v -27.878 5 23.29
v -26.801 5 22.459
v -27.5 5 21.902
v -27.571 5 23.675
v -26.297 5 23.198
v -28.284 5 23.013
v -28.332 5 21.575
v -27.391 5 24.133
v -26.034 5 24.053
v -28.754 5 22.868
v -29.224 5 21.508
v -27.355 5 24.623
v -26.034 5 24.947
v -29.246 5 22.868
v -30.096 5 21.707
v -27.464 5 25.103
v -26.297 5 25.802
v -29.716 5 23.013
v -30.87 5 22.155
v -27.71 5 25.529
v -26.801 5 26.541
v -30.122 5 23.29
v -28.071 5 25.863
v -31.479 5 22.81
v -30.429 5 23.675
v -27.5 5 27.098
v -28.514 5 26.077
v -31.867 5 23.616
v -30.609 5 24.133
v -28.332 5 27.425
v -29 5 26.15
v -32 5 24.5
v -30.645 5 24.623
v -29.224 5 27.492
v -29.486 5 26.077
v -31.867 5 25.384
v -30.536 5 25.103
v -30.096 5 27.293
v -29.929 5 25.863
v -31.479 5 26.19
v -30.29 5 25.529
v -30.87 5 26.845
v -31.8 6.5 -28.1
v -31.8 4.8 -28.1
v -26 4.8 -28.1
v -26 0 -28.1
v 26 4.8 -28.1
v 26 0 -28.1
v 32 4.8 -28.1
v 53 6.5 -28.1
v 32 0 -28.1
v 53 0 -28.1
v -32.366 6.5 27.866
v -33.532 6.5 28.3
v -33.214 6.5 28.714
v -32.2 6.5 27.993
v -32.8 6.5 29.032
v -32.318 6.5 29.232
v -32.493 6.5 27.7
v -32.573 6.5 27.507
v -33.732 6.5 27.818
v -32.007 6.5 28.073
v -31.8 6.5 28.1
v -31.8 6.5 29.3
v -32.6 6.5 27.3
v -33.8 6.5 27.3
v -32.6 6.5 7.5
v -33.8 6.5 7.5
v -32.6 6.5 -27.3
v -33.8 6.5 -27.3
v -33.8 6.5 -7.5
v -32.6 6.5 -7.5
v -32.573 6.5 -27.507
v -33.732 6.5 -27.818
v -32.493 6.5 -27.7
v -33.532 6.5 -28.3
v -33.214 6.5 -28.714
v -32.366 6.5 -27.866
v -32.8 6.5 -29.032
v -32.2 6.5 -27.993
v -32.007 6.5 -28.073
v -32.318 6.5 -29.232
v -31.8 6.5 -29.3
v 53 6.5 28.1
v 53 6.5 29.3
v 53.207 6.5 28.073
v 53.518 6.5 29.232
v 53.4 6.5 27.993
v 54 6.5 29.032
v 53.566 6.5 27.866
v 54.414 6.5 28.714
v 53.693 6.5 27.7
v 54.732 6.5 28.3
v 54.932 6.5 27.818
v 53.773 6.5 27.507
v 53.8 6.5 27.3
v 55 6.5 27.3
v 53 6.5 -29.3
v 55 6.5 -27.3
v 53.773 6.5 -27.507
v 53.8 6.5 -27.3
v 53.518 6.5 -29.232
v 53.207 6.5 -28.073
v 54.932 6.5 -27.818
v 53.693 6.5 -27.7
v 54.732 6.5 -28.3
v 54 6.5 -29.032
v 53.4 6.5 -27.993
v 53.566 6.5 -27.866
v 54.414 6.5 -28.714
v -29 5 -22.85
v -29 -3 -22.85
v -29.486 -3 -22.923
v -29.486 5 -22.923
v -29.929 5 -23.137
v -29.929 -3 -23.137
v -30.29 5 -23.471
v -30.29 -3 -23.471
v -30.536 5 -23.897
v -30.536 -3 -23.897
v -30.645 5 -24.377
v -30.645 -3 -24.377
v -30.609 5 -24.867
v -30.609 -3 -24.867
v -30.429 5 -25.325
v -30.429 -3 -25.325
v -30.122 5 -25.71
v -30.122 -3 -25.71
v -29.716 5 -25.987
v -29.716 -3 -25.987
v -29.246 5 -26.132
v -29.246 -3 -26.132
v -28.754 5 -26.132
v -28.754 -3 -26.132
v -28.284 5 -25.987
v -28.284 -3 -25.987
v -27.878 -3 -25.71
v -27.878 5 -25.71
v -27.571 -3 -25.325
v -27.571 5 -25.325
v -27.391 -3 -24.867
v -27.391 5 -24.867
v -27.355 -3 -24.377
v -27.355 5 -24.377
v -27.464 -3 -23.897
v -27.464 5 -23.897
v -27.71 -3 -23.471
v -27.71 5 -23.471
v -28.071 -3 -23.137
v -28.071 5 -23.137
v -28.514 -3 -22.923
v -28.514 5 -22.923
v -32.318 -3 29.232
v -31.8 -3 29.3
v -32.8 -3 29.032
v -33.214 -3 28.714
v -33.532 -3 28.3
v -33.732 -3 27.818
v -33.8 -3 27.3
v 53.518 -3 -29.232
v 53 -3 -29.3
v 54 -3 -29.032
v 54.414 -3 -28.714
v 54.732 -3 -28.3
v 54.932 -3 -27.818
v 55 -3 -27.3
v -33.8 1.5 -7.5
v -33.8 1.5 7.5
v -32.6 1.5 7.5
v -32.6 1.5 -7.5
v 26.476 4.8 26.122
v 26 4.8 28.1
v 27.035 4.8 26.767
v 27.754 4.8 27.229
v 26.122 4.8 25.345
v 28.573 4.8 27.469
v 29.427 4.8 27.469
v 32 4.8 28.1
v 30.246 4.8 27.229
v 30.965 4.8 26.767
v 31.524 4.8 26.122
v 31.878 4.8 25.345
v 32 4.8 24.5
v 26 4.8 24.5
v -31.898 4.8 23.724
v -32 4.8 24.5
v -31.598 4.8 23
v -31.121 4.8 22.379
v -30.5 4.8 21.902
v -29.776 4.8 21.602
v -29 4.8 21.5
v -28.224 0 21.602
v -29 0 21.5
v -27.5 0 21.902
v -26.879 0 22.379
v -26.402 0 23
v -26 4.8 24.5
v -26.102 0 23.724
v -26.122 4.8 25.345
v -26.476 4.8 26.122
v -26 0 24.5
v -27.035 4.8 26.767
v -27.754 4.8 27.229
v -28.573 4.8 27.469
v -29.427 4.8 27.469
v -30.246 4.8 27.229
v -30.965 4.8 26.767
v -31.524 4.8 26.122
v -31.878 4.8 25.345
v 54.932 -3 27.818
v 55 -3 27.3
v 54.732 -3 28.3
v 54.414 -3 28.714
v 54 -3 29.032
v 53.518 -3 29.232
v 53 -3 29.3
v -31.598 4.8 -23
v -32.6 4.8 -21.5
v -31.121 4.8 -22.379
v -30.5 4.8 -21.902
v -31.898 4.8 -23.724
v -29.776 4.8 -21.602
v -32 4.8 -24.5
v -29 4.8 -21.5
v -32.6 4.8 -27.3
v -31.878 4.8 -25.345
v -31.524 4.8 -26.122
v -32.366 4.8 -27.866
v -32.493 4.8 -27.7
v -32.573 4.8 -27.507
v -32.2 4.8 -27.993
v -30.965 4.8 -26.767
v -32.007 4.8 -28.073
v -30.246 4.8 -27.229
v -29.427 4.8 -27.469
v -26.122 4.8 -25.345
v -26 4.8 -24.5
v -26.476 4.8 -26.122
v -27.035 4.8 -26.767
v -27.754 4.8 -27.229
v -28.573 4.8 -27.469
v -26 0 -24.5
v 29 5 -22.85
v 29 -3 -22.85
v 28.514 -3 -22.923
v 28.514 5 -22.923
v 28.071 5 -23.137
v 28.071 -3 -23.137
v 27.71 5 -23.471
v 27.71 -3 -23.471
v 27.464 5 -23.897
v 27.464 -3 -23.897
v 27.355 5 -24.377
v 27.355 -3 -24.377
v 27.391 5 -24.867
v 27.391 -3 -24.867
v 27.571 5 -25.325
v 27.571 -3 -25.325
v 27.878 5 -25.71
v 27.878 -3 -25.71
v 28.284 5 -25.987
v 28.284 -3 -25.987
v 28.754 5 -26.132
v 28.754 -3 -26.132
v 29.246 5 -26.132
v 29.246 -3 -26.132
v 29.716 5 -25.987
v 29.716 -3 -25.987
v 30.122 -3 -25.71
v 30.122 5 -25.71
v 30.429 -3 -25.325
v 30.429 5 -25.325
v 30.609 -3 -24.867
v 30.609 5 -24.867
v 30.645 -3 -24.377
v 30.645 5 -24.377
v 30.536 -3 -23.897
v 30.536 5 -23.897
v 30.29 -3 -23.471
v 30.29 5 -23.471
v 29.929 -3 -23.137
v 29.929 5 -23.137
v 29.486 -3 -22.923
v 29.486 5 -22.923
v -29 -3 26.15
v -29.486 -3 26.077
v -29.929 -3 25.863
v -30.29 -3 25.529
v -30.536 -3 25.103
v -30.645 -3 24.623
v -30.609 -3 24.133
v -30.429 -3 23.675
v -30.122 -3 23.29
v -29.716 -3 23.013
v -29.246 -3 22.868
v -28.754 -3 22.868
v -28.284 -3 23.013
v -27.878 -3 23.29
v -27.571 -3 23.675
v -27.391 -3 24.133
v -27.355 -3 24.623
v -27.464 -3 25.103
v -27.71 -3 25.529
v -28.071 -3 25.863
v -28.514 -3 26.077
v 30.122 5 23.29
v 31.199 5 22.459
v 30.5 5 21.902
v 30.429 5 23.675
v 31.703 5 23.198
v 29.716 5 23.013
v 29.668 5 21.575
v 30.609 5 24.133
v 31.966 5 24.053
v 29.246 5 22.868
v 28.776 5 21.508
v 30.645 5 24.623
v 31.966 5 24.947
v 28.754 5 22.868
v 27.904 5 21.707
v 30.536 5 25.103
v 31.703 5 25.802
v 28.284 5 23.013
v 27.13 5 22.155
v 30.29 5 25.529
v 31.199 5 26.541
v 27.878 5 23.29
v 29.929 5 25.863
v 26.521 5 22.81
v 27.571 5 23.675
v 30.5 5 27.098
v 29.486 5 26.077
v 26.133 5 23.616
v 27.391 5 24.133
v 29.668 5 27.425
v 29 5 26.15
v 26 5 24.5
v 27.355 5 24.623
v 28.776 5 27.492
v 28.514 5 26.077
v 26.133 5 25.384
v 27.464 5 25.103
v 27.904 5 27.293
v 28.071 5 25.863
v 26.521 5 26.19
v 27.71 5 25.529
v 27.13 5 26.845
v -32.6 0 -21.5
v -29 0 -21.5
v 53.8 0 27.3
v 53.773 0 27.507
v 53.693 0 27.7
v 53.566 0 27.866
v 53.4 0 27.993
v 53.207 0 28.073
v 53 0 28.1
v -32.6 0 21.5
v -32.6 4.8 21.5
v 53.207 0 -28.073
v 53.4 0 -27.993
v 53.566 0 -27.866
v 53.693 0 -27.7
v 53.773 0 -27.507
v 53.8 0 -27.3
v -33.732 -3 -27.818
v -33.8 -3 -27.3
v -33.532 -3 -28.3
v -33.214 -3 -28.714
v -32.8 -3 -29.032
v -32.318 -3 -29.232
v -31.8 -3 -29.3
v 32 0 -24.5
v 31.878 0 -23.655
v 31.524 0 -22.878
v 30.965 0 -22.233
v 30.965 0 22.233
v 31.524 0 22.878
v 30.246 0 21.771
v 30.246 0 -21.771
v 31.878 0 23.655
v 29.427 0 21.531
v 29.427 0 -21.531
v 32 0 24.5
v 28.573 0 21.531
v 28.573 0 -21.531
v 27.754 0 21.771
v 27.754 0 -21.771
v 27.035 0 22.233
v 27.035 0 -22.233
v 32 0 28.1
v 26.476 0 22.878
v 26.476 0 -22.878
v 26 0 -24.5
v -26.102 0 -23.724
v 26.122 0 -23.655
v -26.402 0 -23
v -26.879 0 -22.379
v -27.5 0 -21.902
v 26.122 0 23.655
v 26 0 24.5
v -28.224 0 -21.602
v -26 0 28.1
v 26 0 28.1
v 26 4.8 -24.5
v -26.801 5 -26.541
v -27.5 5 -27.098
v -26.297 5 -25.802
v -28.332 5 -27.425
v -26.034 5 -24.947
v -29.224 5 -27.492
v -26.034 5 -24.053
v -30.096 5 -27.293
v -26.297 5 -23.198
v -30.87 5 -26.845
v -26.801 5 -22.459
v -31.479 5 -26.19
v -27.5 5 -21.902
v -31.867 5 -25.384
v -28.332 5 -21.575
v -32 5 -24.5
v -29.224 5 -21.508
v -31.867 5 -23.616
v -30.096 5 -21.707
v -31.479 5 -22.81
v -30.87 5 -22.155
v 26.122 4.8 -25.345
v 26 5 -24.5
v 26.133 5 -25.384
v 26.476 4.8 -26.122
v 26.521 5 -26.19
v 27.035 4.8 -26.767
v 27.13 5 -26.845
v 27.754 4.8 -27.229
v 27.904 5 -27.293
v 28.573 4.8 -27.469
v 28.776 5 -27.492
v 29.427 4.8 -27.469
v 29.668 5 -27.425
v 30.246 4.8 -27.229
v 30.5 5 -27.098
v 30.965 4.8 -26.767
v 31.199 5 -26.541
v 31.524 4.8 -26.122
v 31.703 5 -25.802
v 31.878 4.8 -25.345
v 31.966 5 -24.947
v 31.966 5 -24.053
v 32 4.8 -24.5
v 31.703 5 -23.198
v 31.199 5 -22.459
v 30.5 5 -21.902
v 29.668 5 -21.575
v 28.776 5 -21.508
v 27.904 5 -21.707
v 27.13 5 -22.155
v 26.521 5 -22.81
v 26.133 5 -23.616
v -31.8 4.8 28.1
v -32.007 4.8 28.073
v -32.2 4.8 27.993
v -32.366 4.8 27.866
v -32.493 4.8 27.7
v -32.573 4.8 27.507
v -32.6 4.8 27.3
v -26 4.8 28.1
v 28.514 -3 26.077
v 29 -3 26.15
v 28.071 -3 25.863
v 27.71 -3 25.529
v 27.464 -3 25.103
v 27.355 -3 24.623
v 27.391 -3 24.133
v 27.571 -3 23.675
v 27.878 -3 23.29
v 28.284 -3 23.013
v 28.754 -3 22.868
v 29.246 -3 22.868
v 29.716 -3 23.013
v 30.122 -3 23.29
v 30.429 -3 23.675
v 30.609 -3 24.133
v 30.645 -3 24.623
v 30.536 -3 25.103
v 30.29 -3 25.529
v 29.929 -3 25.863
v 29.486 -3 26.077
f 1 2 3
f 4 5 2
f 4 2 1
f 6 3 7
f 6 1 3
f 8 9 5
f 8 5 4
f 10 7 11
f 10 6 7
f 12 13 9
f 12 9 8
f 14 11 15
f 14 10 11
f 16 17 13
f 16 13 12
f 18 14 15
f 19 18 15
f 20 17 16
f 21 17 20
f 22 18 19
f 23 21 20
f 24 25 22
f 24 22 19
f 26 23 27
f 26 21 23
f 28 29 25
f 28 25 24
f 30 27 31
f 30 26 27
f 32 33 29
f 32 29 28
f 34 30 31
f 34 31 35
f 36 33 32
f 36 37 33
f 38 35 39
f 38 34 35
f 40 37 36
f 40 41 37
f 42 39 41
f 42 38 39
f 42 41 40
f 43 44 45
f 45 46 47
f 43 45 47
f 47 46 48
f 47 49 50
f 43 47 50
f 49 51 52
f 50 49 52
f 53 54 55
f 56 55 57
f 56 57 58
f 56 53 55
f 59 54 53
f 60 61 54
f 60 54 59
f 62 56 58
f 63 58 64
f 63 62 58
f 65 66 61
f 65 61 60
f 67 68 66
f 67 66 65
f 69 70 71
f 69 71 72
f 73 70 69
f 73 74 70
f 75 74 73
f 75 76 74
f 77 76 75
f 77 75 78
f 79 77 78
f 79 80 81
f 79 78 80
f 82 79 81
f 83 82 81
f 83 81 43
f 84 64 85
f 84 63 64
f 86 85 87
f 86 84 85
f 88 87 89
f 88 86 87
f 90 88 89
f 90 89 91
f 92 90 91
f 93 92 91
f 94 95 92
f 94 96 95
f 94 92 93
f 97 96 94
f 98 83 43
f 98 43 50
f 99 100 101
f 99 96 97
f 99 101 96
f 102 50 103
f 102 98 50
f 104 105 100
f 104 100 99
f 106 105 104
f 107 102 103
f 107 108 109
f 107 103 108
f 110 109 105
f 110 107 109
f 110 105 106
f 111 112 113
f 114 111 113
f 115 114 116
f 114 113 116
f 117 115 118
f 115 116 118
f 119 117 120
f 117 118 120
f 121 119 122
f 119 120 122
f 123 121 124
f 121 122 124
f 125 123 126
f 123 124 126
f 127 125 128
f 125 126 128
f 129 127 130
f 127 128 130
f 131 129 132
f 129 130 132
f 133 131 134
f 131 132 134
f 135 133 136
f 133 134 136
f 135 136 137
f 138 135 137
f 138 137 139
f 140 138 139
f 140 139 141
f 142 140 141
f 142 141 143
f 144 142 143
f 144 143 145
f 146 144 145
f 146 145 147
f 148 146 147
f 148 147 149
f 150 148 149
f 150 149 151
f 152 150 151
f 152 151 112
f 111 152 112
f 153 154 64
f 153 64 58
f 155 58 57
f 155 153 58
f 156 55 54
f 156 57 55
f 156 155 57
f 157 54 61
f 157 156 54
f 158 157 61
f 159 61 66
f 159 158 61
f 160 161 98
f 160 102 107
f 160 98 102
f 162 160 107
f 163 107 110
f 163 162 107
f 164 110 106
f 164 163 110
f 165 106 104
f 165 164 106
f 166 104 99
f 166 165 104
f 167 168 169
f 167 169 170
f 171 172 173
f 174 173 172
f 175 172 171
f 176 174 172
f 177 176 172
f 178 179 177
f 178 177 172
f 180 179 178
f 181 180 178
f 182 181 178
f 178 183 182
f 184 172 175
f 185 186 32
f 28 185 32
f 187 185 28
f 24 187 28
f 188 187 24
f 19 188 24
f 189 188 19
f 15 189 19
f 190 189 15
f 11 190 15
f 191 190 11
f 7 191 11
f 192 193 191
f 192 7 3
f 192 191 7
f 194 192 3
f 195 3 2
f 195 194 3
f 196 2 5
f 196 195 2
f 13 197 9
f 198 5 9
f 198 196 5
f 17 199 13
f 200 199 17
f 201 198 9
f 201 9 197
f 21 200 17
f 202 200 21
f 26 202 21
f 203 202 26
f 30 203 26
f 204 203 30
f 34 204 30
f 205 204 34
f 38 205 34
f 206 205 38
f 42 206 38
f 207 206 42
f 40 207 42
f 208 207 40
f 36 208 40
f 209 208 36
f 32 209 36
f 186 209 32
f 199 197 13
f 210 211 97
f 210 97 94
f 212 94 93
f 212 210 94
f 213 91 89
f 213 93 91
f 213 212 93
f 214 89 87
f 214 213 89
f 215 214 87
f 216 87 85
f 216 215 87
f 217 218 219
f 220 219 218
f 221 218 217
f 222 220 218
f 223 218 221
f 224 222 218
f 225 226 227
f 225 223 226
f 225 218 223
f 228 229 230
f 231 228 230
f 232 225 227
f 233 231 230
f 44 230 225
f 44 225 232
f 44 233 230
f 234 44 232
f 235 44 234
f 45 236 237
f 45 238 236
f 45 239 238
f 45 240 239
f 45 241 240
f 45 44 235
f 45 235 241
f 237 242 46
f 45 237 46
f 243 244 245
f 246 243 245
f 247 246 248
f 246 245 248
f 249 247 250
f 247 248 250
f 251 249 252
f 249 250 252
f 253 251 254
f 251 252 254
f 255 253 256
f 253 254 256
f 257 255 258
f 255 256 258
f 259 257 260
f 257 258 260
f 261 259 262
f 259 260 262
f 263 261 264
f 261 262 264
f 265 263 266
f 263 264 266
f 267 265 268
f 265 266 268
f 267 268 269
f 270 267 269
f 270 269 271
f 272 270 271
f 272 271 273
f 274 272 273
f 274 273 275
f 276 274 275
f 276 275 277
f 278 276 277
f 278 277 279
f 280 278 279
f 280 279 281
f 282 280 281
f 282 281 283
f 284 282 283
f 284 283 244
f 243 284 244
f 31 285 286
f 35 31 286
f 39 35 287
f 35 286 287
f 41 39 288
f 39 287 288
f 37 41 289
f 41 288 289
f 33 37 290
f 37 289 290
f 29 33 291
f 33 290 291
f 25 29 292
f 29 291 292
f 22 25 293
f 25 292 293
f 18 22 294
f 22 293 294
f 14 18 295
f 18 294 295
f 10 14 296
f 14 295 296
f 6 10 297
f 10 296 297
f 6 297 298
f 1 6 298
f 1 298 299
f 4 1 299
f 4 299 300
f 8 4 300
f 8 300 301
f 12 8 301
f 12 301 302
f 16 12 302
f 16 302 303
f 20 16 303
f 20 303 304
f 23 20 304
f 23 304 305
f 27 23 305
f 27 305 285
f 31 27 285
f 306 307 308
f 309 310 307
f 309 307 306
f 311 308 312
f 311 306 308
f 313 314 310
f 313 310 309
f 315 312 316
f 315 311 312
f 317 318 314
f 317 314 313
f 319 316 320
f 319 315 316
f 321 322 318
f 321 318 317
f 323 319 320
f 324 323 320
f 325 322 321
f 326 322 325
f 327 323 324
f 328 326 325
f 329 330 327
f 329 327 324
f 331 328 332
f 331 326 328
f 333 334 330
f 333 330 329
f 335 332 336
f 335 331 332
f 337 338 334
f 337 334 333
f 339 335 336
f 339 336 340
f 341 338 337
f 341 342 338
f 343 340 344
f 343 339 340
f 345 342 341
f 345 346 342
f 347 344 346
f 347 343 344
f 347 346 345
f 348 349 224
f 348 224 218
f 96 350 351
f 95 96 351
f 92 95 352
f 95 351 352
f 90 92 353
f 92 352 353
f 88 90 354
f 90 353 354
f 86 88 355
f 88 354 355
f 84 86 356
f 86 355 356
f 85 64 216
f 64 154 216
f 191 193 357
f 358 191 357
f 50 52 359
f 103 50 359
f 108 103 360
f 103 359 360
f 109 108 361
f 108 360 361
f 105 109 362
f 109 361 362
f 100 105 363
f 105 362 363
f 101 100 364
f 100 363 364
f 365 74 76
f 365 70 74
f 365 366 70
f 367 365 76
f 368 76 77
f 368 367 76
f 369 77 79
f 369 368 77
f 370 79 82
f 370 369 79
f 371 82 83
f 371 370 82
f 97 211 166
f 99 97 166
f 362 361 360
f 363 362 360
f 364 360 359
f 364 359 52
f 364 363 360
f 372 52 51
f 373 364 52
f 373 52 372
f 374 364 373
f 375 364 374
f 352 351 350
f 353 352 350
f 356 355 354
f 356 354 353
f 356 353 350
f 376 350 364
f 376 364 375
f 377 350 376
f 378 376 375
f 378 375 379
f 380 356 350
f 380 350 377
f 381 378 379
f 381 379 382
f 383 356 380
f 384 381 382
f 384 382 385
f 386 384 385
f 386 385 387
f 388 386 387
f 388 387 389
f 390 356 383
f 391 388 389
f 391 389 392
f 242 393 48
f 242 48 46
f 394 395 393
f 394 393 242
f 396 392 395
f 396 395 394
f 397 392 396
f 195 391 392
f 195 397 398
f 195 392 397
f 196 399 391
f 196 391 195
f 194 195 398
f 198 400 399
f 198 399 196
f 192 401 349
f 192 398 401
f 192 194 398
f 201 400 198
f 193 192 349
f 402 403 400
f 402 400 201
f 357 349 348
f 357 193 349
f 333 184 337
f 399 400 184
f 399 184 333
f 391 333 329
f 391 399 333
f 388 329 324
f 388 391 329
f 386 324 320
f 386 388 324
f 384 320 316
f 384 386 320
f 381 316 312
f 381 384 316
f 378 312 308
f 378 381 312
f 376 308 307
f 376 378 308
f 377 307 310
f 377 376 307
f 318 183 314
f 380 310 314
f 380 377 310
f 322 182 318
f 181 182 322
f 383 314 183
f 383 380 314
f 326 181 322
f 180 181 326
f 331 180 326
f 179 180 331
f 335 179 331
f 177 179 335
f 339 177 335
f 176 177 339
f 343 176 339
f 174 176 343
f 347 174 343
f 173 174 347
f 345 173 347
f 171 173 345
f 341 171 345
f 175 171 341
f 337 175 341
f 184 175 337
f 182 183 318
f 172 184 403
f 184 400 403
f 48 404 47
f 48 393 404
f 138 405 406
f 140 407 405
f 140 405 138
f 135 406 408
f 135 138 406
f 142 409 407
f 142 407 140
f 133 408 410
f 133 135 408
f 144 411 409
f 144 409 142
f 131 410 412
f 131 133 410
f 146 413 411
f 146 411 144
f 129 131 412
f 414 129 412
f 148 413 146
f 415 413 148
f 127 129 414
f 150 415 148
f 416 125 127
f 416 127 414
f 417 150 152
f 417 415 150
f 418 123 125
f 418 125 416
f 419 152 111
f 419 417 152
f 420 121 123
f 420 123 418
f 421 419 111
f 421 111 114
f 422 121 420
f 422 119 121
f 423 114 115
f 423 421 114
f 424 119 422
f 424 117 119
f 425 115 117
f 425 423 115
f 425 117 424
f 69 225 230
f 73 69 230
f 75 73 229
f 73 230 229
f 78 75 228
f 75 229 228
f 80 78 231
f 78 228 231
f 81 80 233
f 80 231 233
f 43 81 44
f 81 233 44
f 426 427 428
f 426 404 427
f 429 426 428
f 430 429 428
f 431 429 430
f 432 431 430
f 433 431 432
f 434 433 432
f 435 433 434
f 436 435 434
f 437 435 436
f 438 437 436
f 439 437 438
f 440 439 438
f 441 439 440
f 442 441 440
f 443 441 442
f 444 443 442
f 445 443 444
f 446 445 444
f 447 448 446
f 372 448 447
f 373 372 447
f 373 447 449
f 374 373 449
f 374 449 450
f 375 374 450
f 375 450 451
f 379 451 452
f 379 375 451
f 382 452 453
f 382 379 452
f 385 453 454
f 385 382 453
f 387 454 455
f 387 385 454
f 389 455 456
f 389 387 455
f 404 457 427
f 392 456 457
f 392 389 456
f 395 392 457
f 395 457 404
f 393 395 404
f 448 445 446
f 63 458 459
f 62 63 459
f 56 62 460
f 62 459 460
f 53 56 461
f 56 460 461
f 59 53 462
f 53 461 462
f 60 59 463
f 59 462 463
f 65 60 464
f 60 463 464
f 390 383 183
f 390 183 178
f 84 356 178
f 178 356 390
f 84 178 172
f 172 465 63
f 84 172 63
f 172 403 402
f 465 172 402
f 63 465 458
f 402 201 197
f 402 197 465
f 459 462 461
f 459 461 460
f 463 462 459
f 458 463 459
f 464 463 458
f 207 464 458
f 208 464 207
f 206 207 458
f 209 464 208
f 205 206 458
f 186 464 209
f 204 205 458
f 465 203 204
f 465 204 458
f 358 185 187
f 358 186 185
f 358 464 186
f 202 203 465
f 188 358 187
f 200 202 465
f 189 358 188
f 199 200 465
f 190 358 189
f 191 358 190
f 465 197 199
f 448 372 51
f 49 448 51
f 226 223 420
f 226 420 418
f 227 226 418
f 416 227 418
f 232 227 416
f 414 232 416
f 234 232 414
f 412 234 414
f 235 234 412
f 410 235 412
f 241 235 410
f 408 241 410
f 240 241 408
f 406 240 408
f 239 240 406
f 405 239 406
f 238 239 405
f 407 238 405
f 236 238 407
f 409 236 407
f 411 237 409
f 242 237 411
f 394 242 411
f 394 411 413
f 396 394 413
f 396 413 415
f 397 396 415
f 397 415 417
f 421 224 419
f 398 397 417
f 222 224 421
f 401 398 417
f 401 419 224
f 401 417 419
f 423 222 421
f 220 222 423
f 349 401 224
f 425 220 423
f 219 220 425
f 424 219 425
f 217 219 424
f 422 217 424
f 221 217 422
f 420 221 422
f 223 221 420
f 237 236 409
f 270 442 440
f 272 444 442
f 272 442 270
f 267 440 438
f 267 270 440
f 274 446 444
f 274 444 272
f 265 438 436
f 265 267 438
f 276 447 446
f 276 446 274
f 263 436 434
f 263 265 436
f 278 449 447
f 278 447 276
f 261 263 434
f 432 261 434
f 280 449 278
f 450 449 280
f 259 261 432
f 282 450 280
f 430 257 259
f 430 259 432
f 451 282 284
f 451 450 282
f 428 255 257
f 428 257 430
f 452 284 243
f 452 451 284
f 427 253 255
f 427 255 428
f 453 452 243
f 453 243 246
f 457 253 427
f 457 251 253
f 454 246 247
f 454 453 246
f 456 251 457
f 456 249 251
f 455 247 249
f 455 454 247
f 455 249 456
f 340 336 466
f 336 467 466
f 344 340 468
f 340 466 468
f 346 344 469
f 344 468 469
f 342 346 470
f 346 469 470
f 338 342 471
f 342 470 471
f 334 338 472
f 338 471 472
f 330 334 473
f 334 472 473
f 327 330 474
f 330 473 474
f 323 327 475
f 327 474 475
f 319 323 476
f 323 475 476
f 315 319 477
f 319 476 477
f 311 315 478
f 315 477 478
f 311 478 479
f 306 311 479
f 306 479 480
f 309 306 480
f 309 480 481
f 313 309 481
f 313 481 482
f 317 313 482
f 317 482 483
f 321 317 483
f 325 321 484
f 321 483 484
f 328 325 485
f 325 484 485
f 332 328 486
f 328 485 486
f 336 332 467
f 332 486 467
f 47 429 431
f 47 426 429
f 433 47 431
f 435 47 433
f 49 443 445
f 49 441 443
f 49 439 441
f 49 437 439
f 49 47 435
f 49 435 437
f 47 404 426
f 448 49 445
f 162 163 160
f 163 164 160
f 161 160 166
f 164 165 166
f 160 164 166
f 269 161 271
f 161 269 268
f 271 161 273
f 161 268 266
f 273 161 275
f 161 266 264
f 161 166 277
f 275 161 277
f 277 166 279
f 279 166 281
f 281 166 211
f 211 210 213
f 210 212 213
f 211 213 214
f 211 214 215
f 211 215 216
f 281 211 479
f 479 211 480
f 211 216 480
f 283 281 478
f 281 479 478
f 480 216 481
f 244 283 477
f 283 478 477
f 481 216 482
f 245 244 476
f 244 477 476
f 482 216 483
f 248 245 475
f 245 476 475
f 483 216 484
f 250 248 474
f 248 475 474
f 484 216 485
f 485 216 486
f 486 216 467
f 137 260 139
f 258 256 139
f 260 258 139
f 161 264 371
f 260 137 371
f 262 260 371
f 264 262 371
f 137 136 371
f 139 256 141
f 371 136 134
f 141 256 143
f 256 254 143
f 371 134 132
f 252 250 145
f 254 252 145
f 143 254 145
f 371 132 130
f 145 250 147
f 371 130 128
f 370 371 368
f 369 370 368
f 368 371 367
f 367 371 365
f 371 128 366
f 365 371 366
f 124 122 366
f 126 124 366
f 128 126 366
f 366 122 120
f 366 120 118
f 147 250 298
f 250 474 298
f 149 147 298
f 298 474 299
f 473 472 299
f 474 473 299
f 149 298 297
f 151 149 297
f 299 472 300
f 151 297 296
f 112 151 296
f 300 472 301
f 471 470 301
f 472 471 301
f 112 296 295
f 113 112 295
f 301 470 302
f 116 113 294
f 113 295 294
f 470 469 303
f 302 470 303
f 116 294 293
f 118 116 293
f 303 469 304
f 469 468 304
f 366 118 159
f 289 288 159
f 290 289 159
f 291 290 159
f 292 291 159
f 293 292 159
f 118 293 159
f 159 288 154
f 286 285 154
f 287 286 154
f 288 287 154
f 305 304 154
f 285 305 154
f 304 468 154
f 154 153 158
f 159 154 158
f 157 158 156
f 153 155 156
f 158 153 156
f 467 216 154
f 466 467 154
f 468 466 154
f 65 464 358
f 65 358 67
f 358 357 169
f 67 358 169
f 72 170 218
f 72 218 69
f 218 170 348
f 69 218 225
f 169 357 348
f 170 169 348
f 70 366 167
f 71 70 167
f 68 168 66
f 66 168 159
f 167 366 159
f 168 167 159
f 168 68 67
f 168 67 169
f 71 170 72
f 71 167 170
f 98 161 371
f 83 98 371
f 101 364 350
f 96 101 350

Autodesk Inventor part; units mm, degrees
ref_plane "YZ Plane" through (0, 0, 0) normal (1, 0, 0) x (0, 1, 0)
ref_plane "XZ Plane" through (0, 0, 0) normal (0, 1, 0) x (-1, 0, 0)
ref_plane "XY Plane" through (0, 0, 0) normal (0, 0, 1) x (1, 0, 0)
sketch "Sketch1" plane through (0, 0, 0) normal (0, 1, 0) x (-1, 0, 0)
  line L0 (29, 24.5) -> (-29, 24.5) construction
  line L1 (-29, 24.5) -> (-29, -24.5) construction
  line L2 (-29, -24.5) -> (29, -24.5) construction
  line L3 (29, -24.5) -> (29, 24.5) construction
  circle A0 centre (29, 24.5) radius 3
  circle A1 centre (29, -24.5) radius 3
  circle A2 centre (-29, -24.5) radius 3
  circle A3 centre (-29, 24.5) radius 3
  point P0 (0, 0)
  dimension "d0" = 24.5
  dimension "d1" = 29
  dimension "d2" = 58
  dimension "d3" = 49
  dimension "d4" = 6
  dimension "d5" = 6
  dimension "d6" = 6
  dimension "d7" = 6
extrude "Extrusion1" add sketch "Sketch1" along normal blind 5
sketch "Sketch6" plane through (0, 0, 0) normal (0, 1, 0) x (-1, 0, 0)
  line L0 (33.8, -29.3) -> (-55, -29.3)
  line L1 (-55, -29.3) -> (-55, 29.3)
  line L2 (-55, 29.3) -> (33.8, 29.3)
  line L3 (33.8, 29.3) -> (33.8, -29.3)
  circle A0 centre (29, -24.5) radius 3 projected
  circle A1 centre (-29, 24.5) radius 3 projected
  circle A2 centre (29, 24.5) radius 3 projected
  circle A3 centre (-29, -24.5) radius 3 projected
  line L4 (32, -27.5) -> (-32, -27.5)
  line L5 (-32, -27.5) -> (-32, 27.5)
  line L6 (-32, 27.5) -> (32, 27.5)
  line L7 (32, 27.5) -> (32, -27.5)
  point P0 (0, 0)
  dimension "d30" = 1.8
  dimension "d31" = 55
  dimension "d32" = 64
  dimension "d33" = 27.5
  dimension "d34" = 32
  dimension "d35" = 1.8
  dimension "d36" = 1.8
  dimension "d37" = 23
extrude "Extrusion5" add sketch "Sketch6" against normal blind 3 contours L0 L1 L2 L3 | A0 | L7 L4 A0 | A0 L4 A3 L5 A1 L6 A2 L7 | A2 | A2 L6 L7 | L4 L5 A3 | A3 | A1 | A1 L5 L6
fillet "Fillet2" radius 2 4 edges at (-33.8, -1.5, 29.3) (55, -1.5, 29.3) (55, -1.5, -29.3) (-33.8, -1.5, -29.3)
sketch "Sketch7" plane through (0, 0, 0) normal (0, 1, 0) x (1, 0, 0)
  circle A0 centre (29, 24.5) radius 3 projected
  circle A1 centre (-29, 24.5) radius 3 projected
  circle A2 centre (29, -24.5) radius 3 projected
  circle A3 centre (-29, -24.5) radius 3 projected
  arc A4 (-31.8, 29.3) -> (-33.8, 27.3) centre (-31.8, 27.3) ccw projected
  line L0 (-33.8, 27.3) -> (-33.8, -27.3) projected
  arc A5 (-33.8, -27.3) -> (-31.8, -29.3) centre (-31.8, -27.3) ccw projected
  line L1 (-31.8, -29.3) -> (53, -29.3) projected
  arc A6 (53, -29.3) -> (55, -27.3) centre (53, -27.3) ccw projected
  line L2 (55, -27.3) -> (55, 27.3) projected
  arc A7 (55, 27.3) -> (53, 29.3) centre (53, 27.3) ccw projected
  line L3 (53, 29.3) -> (-31.8, 29.3) projected
  line L4 (53.8, 27.3) -> (53.8, -27.3)
  arc A8 (53, -28.1) -> (53.8, -27.3) centre (53, -27.3) ccw
  line L5 (53, -28.1) -> (-31.8, -28.1)
  arc A9 (-32.6, -27.3) -> (-31.8, -28.1) centre (-31.8, -27.3) ccw
  line L6 (-32.6, -27.3) -> (-32.6, 27.3)
  arc A10 (-31.8, 28.1) -> (-32.6, 27.3) centre (-31.8, 27.3) ccw
  line L7 (-31.8, 28.1) -> (53, 28.1)
  arc A11 (53.8, 27.3) -> (53, 28.1) centre (53, 27.3) ccw
  point P0 (0, 0)
  dimension "d41" = 1.2
extrude "Extrusion6" add sketch "Sketch7" along normal blind 6.5 contours L3 A7 L2 A6 L1 A5 L0 A4
sketch "Sketch8" plane through (0, 0, 0) normal (0, 1, 0) x (1, 0, 0)
  arc A0 (-31.8, 28.1) -> (-32.6, 27.3) centre (-31.8, 27.3) ccw projected
  line L0 (-32.6, 27.3) -> (-32.6, -27.3) projected
  arc A1 (-32.6, -27.3) -> (-31.8, -28.1) centre (-31.8, -27.3) ccw projected
  line L1 (-31.8, -28.1) -> (53, -28.1) projected
  arc A2 (53, -28.1) -> (53.8, -27.3) centre (53, -27.3) ccw projected
  line L2 (53.8, -27.3) -> (53.8, 27.3) projected
  arc A3 (53.8, 27.3) -> (53, 28.1) centre (53, 27.3) ccw projected
  line L3 (53, 28.1) -> (-31.8, 28.1) projected
  circle A4 centre (29, 24.5) radius 3 projected
  circle A5 centre (-29, 24.5) radius 3 projected
  circle A6 centre (29, -24.5) radius 3 projected
  circle A7 centre (-29, -24.5) radius 3 projected
  circle A8 centre (-29, -24.5) radius 3 projected
  line L4 (-29, -21.5) -> (-32.6, -21.5)
  line L5 (-32.6, 27.3) -> (-32.6, -27.3) projected
  line L6 (-26, -24.5) -> (-26, -28.1)
  line L7 (-31.8, -28.1) -> (53, -28.1) projected
  circle A9 centre (-29, 24.5) radius 3 projected
  line L8 (-29, 21.5) -> (-32.6, 21.5)
  line L9 (-26, 24.5) -> (-26, 28.1)
  line L10 (53, 28.1) -> (-31.8, 28.1) projected
  circle A10 centre (29, 24.5) radius 3 projected
  line L11 (26, 24.5) -> (26, 28.1)
  line L12 (32, 24.5) -> (32, 28.1)
  circle A11 centre (29, -24.5) radius 3 projected
  line L13 (32, -24.5) -> (32, -28.1)
  line L14 (26, -24.5) -> (26, -28.1)
  point P0 (0, 0)
extrude "Extrusion7" add sketch "Sketch8" along normal blind 4.8 contours L3 L9 A5 L8 L0 A0 | L3 L12 A4 L11 | L4 A7 L6 L1 A1 L0 | L14 A6 L13 L1
sketch "Sketch9" plane through (-33.8, -3, -27.3) normal (-1, 0, 0) x (0, 0, 1)
  line L0 (0, 0) -> (0, 9.5) projected
  line L1 (54.6, 0) -> (0, 0) projected
  line L2 (54.6, 9.5) -> (54.6, 0) projected
  line L3 (0, 9.5) -> (54.6, 9.5) projected
  line L4 (19.8, 14.5) -> (34.8, 14.5)
  line L5 (34.8, 14.5) -> (34.8, 4.5)
  line L6 (34.8, 4.5) -> (19.8, 4.5)
  line L7 (19.8, 4.5) -> (19.8, 14.5)
  line L8 (0, 9.5) -> (54.6, 9.5) projected
  line L9 (19.8, 14.5) -> (34.8, 4.5) construction
  line L10 (34.8, 14.5) -> (19.8, 4.5) construction
  point P0 (27.3, 3)
  point P1 (27.3, 9.5)
  point P2 (34.8, 9.5)
  point P3 (19.8, 9.5)
  dimension "d46" = 15
  dimension "d47" = 10
extrude "Extrusion8" cut sketch "Sketch9" against normal up to next contours L3 L5 L6 L7
sketch "Sketch10" plane through (-29, 5, 24.5) normal (0, 1, 0) x (1, 0, 0)
  circle A0 centre (0, 0) radius 3 projected
  circle A1 centre (0, 49) radius 3 projected
  circle A2 centre (58, 49) radius 3 projected
  circle A3 centre (58, 0) radius 3 projected
  point P0 (29, 24.5)
hole "Hole2" at (-29, 5, 24.5) at (-29, 5, -24.5) at (29, 5, -24.5) at (29, 5, 24.5) direction (0, -1, 0) diameter 3.3 end through all
properties part number "Pi Back Mount"
